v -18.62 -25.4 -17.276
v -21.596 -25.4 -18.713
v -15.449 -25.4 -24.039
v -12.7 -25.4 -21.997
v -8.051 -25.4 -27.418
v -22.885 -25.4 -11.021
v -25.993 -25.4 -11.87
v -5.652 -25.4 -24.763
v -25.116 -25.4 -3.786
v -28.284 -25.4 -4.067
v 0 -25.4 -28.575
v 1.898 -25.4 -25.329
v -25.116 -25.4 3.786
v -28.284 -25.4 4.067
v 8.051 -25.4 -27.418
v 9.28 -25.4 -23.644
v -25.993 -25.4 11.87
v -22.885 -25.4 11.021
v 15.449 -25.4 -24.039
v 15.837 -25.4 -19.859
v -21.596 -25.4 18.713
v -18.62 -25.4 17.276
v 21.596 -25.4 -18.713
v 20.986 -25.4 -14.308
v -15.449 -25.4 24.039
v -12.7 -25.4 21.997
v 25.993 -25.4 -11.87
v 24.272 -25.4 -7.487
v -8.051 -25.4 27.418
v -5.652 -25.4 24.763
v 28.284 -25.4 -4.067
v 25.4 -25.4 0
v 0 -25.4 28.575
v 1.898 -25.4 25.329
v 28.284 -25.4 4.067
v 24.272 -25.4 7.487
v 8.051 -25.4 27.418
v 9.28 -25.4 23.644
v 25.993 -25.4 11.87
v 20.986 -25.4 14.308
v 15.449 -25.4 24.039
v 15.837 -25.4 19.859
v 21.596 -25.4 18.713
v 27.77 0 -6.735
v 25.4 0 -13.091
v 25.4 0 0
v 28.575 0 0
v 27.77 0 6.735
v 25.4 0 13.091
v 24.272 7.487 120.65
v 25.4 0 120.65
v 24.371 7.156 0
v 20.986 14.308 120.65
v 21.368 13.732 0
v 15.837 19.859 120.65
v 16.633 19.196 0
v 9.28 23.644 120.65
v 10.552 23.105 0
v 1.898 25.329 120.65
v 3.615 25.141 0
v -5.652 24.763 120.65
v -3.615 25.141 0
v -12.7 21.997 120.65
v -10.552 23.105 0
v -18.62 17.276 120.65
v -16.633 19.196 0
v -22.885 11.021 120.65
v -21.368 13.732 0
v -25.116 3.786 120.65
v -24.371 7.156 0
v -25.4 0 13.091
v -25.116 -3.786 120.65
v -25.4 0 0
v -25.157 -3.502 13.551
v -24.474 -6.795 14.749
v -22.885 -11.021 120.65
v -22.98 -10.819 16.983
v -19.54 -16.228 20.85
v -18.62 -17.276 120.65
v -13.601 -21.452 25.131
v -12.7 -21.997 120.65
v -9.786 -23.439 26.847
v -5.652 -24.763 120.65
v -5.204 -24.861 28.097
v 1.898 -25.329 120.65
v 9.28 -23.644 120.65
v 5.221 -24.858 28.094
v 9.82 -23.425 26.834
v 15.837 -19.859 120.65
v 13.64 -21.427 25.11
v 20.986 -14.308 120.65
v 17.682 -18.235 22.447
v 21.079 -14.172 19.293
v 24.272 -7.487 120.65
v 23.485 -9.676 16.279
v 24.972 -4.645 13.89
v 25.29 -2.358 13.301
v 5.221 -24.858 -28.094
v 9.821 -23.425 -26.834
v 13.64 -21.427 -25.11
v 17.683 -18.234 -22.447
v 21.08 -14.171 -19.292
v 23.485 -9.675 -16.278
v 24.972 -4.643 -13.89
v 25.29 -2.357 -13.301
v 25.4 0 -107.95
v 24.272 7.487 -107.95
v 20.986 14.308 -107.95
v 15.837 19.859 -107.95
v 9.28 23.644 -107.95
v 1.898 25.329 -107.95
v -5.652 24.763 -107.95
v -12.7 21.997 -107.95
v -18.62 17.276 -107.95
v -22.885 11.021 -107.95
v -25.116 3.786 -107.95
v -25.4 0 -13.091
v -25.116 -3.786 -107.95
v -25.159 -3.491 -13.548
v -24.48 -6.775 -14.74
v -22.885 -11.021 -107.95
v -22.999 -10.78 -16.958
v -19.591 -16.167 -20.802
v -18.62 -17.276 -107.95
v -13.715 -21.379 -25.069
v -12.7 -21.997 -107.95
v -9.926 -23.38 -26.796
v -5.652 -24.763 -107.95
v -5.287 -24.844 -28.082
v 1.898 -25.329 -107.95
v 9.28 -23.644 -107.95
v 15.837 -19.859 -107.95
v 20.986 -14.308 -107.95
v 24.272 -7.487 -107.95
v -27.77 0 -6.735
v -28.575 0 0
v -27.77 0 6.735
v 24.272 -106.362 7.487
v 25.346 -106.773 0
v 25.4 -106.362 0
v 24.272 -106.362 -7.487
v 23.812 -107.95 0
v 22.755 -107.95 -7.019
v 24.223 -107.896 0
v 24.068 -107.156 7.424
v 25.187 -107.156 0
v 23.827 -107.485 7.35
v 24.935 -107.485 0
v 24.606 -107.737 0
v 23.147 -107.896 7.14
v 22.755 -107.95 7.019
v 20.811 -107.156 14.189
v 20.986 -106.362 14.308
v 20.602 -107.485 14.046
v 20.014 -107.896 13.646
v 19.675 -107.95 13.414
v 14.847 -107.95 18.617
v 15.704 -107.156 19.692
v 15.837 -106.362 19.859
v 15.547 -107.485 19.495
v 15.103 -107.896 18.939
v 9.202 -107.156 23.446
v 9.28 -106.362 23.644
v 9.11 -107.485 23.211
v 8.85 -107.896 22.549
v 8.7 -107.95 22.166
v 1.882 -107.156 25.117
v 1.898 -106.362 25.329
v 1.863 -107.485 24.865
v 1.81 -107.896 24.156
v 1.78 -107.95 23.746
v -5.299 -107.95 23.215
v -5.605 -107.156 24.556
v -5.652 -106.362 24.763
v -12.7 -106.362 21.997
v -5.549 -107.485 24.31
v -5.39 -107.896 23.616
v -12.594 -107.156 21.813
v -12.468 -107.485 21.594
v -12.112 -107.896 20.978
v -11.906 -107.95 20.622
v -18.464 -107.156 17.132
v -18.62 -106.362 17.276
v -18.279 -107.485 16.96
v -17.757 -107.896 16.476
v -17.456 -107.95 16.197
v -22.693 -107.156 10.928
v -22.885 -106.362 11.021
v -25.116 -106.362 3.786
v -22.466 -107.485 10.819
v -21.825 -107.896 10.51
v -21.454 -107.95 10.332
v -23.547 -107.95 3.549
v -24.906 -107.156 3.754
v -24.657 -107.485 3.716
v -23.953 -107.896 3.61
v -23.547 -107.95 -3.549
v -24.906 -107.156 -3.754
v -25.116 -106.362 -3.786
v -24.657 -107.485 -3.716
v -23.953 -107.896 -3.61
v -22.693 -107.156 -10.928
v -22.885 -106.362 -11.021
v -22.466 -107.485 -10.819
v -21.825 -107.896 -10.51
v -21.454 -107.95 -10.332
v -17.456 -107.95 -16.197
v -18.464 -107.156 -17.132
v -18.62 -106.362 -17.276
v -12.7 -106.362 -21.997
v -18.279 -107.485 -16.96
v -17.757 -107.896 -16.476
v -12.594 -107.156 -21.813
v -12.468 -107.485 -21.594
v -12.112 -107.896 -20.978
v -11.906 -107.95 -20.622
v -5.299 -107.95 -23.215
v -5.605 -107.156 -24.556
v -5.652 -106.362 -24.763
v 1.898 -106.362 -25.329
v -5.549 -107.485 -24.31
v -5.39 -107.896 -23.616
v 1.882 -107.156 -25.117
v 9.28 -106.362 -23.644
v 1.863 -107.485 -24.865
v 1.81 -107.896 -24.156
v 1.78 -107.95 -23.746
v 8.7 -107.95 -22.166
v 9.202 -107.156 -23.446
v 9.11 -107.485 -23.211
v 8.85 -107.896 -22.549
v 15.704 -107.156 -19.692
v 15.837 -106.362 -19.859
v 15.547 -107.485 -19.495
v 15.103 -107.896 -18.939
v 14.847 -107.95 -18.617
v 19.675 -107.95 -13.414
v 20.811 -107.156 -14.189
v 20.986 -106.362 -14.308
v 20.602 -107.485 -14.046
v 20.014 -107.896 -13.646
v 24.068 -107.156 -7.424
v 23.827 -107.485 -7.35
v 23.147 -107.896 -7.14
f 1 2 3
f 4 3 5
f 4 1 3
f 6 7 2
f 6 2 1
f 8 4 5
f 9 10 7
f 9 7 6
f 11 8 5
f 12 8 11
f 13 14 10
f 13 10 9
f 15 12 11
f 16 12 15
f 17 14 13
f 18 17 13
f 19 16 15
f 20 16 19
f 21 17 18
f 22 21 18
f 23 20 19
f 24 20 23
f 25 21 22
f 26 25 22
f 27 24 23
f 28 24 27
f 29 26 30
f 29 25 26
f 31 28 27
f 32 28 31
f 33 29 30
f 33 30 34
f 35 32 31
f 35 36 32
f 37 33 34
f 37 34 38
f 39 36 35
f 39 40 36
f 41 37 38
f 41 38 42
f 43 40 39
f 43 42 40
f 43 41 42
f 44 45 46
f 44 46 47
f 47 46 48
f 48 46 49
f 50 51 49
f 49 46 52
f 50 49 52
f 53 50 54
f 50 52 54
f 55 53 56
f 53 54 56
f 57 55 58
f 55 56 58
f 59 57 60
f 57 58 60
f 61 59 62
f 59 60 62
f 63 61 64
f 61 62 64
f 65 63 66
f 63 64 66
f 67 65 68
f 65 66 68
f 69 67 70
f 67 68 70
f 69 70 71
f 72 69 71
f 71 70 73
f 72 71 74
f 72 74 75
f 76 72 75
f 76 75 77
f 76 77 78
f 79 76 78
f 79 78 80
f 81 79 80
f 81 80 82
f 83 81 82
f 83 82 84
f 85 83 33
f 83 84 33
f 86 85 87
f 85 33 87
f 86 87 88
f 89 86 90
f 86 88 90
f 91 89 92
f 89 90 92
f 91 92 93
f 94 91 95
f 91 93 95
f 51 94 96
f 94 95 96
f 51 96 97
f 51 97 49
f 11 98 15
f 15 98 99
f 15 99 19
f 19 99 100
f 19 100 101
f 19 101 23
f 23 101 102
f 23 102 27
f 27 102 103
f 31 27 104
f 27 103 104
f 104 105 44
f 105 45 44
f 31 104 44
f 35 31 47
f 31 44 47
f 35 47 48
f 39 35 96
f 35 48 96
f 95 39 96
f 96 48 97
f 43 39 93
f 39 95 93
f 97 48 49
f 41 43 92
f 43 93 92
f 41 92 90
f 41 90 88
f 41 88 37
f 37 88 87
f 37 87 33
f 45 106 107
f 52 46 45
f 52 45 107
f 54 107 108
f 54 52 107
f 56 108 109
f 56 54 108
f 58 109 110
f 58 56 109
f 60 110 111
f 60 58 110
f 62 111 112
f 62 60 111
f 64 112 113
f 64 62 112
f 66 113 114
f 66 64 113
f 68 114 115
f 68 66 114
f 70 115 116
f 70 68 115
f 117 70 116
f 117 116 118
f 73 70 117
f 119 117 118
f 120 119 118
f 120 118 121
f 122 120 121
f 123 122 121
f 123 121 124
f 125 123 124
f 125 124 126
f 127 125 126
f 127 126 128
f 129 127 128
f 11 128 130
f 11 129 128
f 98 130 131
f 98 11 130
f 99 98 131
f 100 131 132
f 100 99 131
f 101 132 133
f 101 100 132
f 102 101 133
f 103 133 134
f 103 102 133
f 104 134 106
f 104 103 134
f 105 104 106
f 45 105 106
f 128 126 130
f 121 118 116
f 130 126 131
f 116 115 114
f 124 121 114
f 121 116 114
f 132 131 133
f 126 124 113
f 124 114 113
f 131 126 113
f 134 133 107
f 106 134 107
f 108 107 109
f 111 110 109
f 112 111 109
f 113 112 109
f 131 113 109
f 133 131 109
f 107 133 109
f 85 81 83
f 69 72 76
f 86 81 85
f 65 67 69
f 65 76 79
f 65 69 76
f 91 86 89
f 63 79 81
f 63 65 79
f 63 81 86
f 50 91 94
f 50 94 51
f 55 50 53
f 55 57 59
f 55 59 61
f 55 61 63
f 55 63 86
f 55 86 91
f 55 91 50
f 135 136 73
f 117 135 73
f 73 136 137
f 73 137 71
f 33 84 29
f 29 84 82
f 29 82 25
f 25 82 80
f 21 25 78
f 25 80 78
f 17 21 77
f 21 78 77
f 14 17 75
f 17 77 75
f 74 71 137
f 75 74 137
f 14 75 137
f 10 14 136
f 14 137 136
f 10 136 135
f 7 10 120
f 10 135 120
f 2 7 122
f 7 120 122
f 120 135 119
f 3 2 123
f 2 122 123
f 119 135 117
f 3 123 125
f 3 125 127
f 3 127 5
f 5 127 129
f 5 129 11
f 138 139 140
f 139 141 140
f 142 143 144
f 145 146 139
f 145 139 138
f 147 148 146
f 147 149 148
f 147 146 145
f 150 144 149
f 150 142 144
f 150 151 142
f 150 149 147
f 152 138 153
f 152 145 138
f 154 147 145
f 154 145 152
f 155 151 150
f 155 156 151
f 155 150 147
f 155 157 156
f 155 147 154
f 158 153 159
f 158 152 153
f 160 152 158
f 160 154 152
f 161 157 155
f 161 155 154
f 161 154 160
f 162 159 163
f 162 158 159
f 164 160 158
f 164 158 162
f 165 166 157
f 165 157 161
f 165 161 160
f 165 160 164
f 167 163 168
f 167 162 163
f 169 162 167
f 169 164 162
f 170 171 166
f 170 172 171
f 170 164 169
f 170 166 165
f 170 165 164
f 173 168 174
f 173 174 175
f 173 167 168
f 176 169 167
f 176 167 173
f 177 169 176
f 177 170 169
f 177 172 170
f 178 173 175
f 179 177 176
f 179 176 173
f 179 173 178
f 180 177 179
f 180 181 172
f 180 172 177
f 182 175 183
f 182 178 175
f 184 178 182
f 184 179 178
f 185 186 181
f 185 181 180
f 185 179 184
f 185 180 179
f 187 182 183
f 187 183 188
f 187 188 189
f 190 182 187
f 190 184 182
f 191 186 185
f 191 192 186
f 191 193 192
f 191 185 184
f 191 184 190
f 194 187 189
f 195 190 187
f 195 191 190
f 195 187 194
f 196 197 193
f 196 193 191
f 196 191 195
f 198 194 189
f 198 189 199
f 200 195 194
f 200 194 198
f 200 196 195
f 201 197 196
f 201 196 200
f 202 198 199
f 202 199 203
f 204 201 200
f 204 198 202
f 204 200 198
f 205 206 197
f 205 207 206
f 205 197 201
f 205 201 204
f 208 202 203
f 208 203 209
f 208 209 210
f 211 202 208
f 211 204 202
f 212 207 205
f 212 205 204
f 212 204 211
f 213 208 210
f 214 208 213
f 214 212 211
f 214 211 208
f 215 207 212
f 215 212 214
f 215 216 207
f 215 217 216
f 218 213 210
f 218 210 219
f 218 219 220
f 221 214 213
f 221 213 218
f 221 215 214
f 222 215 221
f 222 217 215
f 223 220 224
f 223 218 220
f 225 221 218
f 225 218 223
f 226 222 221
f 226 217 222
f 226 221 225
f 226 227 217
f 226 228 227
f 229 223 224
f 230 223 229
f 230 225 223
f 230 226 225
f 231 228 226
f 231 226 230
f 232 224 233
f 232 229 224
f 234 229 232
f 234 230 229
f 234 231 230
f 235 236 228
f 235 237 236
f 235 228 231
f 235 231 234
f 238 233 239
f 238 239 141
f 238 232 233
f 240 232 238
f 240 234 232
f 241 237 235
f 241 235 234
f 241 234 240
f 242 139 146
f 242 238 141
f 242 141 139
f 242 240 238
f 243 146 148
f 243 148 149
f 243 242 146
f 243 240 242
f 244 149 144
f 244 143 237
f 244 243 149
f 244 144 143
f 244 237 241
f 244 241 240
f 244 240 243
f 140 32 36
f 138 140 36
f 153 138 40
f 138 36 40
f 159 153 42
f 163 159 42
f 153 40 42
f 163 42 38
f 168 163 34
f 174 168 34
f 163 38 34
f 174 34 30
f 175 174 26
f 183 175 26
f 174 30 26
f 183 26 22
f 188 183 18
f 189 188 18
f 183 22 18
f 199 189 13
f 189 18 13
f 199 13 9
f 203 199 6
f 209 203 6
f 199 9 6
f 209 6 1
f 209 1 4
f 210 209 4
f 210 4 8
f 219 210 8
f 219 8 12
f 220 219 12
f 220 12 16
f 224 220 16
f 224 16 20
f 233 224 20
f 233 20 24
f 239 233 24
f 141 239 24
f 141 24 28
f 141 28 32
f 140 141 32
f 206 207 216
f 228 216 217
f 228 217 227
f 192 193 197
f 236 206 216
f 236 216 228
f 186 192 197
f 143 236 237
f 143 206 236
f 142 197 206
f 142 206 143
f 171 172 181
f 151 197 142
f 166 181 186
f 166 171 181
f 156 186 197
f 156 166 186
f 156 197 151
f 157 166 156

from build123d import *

# Parameters (mm, degrees)
F0_R     = 28.575
F1_DEPTH = 25.4
F2_R     = 25.4
F3_DEPTH = 82.55
F4_R     = 25.4
F5_DEPTH = 107.95
F6_R     = 25.4
F7_DEPTH = 120.65
F8_R     = 1.5875


with BuildPart() as f1:
    # F0 (on Front) → F1 (new body)
    with BuildSketch(Plane.XZ):
        Circle(F0_R)
    extrude(amount=F1_DEPTH)

    # F2 (on face) → F3 (join)
    with BuildSketch(Plane.XZ.offset(25.4)):
        Circle(F2_R)
    extrude(amount=F3_DEPTH)

    # F4 (on Top) → F5 (join)
    with BuildSketch(Plane.XY):
        Circle(F4_R)
    extrude(amount=-F5_DEPTH)

    # F6 (on Top) → F7 (join)
    with BuildSketch(Plane.XY):
        Circle(F6_R)
    extrude(amount=F7_DEPTH)

    # F8
    f8_edges = [f1.edges().sort_by_distance(p)[0] for p in [
        (-25.4, -107.95, 0),
    ]]
    fillet(f8_edges, radius=F8_R)


solid = f1.part
